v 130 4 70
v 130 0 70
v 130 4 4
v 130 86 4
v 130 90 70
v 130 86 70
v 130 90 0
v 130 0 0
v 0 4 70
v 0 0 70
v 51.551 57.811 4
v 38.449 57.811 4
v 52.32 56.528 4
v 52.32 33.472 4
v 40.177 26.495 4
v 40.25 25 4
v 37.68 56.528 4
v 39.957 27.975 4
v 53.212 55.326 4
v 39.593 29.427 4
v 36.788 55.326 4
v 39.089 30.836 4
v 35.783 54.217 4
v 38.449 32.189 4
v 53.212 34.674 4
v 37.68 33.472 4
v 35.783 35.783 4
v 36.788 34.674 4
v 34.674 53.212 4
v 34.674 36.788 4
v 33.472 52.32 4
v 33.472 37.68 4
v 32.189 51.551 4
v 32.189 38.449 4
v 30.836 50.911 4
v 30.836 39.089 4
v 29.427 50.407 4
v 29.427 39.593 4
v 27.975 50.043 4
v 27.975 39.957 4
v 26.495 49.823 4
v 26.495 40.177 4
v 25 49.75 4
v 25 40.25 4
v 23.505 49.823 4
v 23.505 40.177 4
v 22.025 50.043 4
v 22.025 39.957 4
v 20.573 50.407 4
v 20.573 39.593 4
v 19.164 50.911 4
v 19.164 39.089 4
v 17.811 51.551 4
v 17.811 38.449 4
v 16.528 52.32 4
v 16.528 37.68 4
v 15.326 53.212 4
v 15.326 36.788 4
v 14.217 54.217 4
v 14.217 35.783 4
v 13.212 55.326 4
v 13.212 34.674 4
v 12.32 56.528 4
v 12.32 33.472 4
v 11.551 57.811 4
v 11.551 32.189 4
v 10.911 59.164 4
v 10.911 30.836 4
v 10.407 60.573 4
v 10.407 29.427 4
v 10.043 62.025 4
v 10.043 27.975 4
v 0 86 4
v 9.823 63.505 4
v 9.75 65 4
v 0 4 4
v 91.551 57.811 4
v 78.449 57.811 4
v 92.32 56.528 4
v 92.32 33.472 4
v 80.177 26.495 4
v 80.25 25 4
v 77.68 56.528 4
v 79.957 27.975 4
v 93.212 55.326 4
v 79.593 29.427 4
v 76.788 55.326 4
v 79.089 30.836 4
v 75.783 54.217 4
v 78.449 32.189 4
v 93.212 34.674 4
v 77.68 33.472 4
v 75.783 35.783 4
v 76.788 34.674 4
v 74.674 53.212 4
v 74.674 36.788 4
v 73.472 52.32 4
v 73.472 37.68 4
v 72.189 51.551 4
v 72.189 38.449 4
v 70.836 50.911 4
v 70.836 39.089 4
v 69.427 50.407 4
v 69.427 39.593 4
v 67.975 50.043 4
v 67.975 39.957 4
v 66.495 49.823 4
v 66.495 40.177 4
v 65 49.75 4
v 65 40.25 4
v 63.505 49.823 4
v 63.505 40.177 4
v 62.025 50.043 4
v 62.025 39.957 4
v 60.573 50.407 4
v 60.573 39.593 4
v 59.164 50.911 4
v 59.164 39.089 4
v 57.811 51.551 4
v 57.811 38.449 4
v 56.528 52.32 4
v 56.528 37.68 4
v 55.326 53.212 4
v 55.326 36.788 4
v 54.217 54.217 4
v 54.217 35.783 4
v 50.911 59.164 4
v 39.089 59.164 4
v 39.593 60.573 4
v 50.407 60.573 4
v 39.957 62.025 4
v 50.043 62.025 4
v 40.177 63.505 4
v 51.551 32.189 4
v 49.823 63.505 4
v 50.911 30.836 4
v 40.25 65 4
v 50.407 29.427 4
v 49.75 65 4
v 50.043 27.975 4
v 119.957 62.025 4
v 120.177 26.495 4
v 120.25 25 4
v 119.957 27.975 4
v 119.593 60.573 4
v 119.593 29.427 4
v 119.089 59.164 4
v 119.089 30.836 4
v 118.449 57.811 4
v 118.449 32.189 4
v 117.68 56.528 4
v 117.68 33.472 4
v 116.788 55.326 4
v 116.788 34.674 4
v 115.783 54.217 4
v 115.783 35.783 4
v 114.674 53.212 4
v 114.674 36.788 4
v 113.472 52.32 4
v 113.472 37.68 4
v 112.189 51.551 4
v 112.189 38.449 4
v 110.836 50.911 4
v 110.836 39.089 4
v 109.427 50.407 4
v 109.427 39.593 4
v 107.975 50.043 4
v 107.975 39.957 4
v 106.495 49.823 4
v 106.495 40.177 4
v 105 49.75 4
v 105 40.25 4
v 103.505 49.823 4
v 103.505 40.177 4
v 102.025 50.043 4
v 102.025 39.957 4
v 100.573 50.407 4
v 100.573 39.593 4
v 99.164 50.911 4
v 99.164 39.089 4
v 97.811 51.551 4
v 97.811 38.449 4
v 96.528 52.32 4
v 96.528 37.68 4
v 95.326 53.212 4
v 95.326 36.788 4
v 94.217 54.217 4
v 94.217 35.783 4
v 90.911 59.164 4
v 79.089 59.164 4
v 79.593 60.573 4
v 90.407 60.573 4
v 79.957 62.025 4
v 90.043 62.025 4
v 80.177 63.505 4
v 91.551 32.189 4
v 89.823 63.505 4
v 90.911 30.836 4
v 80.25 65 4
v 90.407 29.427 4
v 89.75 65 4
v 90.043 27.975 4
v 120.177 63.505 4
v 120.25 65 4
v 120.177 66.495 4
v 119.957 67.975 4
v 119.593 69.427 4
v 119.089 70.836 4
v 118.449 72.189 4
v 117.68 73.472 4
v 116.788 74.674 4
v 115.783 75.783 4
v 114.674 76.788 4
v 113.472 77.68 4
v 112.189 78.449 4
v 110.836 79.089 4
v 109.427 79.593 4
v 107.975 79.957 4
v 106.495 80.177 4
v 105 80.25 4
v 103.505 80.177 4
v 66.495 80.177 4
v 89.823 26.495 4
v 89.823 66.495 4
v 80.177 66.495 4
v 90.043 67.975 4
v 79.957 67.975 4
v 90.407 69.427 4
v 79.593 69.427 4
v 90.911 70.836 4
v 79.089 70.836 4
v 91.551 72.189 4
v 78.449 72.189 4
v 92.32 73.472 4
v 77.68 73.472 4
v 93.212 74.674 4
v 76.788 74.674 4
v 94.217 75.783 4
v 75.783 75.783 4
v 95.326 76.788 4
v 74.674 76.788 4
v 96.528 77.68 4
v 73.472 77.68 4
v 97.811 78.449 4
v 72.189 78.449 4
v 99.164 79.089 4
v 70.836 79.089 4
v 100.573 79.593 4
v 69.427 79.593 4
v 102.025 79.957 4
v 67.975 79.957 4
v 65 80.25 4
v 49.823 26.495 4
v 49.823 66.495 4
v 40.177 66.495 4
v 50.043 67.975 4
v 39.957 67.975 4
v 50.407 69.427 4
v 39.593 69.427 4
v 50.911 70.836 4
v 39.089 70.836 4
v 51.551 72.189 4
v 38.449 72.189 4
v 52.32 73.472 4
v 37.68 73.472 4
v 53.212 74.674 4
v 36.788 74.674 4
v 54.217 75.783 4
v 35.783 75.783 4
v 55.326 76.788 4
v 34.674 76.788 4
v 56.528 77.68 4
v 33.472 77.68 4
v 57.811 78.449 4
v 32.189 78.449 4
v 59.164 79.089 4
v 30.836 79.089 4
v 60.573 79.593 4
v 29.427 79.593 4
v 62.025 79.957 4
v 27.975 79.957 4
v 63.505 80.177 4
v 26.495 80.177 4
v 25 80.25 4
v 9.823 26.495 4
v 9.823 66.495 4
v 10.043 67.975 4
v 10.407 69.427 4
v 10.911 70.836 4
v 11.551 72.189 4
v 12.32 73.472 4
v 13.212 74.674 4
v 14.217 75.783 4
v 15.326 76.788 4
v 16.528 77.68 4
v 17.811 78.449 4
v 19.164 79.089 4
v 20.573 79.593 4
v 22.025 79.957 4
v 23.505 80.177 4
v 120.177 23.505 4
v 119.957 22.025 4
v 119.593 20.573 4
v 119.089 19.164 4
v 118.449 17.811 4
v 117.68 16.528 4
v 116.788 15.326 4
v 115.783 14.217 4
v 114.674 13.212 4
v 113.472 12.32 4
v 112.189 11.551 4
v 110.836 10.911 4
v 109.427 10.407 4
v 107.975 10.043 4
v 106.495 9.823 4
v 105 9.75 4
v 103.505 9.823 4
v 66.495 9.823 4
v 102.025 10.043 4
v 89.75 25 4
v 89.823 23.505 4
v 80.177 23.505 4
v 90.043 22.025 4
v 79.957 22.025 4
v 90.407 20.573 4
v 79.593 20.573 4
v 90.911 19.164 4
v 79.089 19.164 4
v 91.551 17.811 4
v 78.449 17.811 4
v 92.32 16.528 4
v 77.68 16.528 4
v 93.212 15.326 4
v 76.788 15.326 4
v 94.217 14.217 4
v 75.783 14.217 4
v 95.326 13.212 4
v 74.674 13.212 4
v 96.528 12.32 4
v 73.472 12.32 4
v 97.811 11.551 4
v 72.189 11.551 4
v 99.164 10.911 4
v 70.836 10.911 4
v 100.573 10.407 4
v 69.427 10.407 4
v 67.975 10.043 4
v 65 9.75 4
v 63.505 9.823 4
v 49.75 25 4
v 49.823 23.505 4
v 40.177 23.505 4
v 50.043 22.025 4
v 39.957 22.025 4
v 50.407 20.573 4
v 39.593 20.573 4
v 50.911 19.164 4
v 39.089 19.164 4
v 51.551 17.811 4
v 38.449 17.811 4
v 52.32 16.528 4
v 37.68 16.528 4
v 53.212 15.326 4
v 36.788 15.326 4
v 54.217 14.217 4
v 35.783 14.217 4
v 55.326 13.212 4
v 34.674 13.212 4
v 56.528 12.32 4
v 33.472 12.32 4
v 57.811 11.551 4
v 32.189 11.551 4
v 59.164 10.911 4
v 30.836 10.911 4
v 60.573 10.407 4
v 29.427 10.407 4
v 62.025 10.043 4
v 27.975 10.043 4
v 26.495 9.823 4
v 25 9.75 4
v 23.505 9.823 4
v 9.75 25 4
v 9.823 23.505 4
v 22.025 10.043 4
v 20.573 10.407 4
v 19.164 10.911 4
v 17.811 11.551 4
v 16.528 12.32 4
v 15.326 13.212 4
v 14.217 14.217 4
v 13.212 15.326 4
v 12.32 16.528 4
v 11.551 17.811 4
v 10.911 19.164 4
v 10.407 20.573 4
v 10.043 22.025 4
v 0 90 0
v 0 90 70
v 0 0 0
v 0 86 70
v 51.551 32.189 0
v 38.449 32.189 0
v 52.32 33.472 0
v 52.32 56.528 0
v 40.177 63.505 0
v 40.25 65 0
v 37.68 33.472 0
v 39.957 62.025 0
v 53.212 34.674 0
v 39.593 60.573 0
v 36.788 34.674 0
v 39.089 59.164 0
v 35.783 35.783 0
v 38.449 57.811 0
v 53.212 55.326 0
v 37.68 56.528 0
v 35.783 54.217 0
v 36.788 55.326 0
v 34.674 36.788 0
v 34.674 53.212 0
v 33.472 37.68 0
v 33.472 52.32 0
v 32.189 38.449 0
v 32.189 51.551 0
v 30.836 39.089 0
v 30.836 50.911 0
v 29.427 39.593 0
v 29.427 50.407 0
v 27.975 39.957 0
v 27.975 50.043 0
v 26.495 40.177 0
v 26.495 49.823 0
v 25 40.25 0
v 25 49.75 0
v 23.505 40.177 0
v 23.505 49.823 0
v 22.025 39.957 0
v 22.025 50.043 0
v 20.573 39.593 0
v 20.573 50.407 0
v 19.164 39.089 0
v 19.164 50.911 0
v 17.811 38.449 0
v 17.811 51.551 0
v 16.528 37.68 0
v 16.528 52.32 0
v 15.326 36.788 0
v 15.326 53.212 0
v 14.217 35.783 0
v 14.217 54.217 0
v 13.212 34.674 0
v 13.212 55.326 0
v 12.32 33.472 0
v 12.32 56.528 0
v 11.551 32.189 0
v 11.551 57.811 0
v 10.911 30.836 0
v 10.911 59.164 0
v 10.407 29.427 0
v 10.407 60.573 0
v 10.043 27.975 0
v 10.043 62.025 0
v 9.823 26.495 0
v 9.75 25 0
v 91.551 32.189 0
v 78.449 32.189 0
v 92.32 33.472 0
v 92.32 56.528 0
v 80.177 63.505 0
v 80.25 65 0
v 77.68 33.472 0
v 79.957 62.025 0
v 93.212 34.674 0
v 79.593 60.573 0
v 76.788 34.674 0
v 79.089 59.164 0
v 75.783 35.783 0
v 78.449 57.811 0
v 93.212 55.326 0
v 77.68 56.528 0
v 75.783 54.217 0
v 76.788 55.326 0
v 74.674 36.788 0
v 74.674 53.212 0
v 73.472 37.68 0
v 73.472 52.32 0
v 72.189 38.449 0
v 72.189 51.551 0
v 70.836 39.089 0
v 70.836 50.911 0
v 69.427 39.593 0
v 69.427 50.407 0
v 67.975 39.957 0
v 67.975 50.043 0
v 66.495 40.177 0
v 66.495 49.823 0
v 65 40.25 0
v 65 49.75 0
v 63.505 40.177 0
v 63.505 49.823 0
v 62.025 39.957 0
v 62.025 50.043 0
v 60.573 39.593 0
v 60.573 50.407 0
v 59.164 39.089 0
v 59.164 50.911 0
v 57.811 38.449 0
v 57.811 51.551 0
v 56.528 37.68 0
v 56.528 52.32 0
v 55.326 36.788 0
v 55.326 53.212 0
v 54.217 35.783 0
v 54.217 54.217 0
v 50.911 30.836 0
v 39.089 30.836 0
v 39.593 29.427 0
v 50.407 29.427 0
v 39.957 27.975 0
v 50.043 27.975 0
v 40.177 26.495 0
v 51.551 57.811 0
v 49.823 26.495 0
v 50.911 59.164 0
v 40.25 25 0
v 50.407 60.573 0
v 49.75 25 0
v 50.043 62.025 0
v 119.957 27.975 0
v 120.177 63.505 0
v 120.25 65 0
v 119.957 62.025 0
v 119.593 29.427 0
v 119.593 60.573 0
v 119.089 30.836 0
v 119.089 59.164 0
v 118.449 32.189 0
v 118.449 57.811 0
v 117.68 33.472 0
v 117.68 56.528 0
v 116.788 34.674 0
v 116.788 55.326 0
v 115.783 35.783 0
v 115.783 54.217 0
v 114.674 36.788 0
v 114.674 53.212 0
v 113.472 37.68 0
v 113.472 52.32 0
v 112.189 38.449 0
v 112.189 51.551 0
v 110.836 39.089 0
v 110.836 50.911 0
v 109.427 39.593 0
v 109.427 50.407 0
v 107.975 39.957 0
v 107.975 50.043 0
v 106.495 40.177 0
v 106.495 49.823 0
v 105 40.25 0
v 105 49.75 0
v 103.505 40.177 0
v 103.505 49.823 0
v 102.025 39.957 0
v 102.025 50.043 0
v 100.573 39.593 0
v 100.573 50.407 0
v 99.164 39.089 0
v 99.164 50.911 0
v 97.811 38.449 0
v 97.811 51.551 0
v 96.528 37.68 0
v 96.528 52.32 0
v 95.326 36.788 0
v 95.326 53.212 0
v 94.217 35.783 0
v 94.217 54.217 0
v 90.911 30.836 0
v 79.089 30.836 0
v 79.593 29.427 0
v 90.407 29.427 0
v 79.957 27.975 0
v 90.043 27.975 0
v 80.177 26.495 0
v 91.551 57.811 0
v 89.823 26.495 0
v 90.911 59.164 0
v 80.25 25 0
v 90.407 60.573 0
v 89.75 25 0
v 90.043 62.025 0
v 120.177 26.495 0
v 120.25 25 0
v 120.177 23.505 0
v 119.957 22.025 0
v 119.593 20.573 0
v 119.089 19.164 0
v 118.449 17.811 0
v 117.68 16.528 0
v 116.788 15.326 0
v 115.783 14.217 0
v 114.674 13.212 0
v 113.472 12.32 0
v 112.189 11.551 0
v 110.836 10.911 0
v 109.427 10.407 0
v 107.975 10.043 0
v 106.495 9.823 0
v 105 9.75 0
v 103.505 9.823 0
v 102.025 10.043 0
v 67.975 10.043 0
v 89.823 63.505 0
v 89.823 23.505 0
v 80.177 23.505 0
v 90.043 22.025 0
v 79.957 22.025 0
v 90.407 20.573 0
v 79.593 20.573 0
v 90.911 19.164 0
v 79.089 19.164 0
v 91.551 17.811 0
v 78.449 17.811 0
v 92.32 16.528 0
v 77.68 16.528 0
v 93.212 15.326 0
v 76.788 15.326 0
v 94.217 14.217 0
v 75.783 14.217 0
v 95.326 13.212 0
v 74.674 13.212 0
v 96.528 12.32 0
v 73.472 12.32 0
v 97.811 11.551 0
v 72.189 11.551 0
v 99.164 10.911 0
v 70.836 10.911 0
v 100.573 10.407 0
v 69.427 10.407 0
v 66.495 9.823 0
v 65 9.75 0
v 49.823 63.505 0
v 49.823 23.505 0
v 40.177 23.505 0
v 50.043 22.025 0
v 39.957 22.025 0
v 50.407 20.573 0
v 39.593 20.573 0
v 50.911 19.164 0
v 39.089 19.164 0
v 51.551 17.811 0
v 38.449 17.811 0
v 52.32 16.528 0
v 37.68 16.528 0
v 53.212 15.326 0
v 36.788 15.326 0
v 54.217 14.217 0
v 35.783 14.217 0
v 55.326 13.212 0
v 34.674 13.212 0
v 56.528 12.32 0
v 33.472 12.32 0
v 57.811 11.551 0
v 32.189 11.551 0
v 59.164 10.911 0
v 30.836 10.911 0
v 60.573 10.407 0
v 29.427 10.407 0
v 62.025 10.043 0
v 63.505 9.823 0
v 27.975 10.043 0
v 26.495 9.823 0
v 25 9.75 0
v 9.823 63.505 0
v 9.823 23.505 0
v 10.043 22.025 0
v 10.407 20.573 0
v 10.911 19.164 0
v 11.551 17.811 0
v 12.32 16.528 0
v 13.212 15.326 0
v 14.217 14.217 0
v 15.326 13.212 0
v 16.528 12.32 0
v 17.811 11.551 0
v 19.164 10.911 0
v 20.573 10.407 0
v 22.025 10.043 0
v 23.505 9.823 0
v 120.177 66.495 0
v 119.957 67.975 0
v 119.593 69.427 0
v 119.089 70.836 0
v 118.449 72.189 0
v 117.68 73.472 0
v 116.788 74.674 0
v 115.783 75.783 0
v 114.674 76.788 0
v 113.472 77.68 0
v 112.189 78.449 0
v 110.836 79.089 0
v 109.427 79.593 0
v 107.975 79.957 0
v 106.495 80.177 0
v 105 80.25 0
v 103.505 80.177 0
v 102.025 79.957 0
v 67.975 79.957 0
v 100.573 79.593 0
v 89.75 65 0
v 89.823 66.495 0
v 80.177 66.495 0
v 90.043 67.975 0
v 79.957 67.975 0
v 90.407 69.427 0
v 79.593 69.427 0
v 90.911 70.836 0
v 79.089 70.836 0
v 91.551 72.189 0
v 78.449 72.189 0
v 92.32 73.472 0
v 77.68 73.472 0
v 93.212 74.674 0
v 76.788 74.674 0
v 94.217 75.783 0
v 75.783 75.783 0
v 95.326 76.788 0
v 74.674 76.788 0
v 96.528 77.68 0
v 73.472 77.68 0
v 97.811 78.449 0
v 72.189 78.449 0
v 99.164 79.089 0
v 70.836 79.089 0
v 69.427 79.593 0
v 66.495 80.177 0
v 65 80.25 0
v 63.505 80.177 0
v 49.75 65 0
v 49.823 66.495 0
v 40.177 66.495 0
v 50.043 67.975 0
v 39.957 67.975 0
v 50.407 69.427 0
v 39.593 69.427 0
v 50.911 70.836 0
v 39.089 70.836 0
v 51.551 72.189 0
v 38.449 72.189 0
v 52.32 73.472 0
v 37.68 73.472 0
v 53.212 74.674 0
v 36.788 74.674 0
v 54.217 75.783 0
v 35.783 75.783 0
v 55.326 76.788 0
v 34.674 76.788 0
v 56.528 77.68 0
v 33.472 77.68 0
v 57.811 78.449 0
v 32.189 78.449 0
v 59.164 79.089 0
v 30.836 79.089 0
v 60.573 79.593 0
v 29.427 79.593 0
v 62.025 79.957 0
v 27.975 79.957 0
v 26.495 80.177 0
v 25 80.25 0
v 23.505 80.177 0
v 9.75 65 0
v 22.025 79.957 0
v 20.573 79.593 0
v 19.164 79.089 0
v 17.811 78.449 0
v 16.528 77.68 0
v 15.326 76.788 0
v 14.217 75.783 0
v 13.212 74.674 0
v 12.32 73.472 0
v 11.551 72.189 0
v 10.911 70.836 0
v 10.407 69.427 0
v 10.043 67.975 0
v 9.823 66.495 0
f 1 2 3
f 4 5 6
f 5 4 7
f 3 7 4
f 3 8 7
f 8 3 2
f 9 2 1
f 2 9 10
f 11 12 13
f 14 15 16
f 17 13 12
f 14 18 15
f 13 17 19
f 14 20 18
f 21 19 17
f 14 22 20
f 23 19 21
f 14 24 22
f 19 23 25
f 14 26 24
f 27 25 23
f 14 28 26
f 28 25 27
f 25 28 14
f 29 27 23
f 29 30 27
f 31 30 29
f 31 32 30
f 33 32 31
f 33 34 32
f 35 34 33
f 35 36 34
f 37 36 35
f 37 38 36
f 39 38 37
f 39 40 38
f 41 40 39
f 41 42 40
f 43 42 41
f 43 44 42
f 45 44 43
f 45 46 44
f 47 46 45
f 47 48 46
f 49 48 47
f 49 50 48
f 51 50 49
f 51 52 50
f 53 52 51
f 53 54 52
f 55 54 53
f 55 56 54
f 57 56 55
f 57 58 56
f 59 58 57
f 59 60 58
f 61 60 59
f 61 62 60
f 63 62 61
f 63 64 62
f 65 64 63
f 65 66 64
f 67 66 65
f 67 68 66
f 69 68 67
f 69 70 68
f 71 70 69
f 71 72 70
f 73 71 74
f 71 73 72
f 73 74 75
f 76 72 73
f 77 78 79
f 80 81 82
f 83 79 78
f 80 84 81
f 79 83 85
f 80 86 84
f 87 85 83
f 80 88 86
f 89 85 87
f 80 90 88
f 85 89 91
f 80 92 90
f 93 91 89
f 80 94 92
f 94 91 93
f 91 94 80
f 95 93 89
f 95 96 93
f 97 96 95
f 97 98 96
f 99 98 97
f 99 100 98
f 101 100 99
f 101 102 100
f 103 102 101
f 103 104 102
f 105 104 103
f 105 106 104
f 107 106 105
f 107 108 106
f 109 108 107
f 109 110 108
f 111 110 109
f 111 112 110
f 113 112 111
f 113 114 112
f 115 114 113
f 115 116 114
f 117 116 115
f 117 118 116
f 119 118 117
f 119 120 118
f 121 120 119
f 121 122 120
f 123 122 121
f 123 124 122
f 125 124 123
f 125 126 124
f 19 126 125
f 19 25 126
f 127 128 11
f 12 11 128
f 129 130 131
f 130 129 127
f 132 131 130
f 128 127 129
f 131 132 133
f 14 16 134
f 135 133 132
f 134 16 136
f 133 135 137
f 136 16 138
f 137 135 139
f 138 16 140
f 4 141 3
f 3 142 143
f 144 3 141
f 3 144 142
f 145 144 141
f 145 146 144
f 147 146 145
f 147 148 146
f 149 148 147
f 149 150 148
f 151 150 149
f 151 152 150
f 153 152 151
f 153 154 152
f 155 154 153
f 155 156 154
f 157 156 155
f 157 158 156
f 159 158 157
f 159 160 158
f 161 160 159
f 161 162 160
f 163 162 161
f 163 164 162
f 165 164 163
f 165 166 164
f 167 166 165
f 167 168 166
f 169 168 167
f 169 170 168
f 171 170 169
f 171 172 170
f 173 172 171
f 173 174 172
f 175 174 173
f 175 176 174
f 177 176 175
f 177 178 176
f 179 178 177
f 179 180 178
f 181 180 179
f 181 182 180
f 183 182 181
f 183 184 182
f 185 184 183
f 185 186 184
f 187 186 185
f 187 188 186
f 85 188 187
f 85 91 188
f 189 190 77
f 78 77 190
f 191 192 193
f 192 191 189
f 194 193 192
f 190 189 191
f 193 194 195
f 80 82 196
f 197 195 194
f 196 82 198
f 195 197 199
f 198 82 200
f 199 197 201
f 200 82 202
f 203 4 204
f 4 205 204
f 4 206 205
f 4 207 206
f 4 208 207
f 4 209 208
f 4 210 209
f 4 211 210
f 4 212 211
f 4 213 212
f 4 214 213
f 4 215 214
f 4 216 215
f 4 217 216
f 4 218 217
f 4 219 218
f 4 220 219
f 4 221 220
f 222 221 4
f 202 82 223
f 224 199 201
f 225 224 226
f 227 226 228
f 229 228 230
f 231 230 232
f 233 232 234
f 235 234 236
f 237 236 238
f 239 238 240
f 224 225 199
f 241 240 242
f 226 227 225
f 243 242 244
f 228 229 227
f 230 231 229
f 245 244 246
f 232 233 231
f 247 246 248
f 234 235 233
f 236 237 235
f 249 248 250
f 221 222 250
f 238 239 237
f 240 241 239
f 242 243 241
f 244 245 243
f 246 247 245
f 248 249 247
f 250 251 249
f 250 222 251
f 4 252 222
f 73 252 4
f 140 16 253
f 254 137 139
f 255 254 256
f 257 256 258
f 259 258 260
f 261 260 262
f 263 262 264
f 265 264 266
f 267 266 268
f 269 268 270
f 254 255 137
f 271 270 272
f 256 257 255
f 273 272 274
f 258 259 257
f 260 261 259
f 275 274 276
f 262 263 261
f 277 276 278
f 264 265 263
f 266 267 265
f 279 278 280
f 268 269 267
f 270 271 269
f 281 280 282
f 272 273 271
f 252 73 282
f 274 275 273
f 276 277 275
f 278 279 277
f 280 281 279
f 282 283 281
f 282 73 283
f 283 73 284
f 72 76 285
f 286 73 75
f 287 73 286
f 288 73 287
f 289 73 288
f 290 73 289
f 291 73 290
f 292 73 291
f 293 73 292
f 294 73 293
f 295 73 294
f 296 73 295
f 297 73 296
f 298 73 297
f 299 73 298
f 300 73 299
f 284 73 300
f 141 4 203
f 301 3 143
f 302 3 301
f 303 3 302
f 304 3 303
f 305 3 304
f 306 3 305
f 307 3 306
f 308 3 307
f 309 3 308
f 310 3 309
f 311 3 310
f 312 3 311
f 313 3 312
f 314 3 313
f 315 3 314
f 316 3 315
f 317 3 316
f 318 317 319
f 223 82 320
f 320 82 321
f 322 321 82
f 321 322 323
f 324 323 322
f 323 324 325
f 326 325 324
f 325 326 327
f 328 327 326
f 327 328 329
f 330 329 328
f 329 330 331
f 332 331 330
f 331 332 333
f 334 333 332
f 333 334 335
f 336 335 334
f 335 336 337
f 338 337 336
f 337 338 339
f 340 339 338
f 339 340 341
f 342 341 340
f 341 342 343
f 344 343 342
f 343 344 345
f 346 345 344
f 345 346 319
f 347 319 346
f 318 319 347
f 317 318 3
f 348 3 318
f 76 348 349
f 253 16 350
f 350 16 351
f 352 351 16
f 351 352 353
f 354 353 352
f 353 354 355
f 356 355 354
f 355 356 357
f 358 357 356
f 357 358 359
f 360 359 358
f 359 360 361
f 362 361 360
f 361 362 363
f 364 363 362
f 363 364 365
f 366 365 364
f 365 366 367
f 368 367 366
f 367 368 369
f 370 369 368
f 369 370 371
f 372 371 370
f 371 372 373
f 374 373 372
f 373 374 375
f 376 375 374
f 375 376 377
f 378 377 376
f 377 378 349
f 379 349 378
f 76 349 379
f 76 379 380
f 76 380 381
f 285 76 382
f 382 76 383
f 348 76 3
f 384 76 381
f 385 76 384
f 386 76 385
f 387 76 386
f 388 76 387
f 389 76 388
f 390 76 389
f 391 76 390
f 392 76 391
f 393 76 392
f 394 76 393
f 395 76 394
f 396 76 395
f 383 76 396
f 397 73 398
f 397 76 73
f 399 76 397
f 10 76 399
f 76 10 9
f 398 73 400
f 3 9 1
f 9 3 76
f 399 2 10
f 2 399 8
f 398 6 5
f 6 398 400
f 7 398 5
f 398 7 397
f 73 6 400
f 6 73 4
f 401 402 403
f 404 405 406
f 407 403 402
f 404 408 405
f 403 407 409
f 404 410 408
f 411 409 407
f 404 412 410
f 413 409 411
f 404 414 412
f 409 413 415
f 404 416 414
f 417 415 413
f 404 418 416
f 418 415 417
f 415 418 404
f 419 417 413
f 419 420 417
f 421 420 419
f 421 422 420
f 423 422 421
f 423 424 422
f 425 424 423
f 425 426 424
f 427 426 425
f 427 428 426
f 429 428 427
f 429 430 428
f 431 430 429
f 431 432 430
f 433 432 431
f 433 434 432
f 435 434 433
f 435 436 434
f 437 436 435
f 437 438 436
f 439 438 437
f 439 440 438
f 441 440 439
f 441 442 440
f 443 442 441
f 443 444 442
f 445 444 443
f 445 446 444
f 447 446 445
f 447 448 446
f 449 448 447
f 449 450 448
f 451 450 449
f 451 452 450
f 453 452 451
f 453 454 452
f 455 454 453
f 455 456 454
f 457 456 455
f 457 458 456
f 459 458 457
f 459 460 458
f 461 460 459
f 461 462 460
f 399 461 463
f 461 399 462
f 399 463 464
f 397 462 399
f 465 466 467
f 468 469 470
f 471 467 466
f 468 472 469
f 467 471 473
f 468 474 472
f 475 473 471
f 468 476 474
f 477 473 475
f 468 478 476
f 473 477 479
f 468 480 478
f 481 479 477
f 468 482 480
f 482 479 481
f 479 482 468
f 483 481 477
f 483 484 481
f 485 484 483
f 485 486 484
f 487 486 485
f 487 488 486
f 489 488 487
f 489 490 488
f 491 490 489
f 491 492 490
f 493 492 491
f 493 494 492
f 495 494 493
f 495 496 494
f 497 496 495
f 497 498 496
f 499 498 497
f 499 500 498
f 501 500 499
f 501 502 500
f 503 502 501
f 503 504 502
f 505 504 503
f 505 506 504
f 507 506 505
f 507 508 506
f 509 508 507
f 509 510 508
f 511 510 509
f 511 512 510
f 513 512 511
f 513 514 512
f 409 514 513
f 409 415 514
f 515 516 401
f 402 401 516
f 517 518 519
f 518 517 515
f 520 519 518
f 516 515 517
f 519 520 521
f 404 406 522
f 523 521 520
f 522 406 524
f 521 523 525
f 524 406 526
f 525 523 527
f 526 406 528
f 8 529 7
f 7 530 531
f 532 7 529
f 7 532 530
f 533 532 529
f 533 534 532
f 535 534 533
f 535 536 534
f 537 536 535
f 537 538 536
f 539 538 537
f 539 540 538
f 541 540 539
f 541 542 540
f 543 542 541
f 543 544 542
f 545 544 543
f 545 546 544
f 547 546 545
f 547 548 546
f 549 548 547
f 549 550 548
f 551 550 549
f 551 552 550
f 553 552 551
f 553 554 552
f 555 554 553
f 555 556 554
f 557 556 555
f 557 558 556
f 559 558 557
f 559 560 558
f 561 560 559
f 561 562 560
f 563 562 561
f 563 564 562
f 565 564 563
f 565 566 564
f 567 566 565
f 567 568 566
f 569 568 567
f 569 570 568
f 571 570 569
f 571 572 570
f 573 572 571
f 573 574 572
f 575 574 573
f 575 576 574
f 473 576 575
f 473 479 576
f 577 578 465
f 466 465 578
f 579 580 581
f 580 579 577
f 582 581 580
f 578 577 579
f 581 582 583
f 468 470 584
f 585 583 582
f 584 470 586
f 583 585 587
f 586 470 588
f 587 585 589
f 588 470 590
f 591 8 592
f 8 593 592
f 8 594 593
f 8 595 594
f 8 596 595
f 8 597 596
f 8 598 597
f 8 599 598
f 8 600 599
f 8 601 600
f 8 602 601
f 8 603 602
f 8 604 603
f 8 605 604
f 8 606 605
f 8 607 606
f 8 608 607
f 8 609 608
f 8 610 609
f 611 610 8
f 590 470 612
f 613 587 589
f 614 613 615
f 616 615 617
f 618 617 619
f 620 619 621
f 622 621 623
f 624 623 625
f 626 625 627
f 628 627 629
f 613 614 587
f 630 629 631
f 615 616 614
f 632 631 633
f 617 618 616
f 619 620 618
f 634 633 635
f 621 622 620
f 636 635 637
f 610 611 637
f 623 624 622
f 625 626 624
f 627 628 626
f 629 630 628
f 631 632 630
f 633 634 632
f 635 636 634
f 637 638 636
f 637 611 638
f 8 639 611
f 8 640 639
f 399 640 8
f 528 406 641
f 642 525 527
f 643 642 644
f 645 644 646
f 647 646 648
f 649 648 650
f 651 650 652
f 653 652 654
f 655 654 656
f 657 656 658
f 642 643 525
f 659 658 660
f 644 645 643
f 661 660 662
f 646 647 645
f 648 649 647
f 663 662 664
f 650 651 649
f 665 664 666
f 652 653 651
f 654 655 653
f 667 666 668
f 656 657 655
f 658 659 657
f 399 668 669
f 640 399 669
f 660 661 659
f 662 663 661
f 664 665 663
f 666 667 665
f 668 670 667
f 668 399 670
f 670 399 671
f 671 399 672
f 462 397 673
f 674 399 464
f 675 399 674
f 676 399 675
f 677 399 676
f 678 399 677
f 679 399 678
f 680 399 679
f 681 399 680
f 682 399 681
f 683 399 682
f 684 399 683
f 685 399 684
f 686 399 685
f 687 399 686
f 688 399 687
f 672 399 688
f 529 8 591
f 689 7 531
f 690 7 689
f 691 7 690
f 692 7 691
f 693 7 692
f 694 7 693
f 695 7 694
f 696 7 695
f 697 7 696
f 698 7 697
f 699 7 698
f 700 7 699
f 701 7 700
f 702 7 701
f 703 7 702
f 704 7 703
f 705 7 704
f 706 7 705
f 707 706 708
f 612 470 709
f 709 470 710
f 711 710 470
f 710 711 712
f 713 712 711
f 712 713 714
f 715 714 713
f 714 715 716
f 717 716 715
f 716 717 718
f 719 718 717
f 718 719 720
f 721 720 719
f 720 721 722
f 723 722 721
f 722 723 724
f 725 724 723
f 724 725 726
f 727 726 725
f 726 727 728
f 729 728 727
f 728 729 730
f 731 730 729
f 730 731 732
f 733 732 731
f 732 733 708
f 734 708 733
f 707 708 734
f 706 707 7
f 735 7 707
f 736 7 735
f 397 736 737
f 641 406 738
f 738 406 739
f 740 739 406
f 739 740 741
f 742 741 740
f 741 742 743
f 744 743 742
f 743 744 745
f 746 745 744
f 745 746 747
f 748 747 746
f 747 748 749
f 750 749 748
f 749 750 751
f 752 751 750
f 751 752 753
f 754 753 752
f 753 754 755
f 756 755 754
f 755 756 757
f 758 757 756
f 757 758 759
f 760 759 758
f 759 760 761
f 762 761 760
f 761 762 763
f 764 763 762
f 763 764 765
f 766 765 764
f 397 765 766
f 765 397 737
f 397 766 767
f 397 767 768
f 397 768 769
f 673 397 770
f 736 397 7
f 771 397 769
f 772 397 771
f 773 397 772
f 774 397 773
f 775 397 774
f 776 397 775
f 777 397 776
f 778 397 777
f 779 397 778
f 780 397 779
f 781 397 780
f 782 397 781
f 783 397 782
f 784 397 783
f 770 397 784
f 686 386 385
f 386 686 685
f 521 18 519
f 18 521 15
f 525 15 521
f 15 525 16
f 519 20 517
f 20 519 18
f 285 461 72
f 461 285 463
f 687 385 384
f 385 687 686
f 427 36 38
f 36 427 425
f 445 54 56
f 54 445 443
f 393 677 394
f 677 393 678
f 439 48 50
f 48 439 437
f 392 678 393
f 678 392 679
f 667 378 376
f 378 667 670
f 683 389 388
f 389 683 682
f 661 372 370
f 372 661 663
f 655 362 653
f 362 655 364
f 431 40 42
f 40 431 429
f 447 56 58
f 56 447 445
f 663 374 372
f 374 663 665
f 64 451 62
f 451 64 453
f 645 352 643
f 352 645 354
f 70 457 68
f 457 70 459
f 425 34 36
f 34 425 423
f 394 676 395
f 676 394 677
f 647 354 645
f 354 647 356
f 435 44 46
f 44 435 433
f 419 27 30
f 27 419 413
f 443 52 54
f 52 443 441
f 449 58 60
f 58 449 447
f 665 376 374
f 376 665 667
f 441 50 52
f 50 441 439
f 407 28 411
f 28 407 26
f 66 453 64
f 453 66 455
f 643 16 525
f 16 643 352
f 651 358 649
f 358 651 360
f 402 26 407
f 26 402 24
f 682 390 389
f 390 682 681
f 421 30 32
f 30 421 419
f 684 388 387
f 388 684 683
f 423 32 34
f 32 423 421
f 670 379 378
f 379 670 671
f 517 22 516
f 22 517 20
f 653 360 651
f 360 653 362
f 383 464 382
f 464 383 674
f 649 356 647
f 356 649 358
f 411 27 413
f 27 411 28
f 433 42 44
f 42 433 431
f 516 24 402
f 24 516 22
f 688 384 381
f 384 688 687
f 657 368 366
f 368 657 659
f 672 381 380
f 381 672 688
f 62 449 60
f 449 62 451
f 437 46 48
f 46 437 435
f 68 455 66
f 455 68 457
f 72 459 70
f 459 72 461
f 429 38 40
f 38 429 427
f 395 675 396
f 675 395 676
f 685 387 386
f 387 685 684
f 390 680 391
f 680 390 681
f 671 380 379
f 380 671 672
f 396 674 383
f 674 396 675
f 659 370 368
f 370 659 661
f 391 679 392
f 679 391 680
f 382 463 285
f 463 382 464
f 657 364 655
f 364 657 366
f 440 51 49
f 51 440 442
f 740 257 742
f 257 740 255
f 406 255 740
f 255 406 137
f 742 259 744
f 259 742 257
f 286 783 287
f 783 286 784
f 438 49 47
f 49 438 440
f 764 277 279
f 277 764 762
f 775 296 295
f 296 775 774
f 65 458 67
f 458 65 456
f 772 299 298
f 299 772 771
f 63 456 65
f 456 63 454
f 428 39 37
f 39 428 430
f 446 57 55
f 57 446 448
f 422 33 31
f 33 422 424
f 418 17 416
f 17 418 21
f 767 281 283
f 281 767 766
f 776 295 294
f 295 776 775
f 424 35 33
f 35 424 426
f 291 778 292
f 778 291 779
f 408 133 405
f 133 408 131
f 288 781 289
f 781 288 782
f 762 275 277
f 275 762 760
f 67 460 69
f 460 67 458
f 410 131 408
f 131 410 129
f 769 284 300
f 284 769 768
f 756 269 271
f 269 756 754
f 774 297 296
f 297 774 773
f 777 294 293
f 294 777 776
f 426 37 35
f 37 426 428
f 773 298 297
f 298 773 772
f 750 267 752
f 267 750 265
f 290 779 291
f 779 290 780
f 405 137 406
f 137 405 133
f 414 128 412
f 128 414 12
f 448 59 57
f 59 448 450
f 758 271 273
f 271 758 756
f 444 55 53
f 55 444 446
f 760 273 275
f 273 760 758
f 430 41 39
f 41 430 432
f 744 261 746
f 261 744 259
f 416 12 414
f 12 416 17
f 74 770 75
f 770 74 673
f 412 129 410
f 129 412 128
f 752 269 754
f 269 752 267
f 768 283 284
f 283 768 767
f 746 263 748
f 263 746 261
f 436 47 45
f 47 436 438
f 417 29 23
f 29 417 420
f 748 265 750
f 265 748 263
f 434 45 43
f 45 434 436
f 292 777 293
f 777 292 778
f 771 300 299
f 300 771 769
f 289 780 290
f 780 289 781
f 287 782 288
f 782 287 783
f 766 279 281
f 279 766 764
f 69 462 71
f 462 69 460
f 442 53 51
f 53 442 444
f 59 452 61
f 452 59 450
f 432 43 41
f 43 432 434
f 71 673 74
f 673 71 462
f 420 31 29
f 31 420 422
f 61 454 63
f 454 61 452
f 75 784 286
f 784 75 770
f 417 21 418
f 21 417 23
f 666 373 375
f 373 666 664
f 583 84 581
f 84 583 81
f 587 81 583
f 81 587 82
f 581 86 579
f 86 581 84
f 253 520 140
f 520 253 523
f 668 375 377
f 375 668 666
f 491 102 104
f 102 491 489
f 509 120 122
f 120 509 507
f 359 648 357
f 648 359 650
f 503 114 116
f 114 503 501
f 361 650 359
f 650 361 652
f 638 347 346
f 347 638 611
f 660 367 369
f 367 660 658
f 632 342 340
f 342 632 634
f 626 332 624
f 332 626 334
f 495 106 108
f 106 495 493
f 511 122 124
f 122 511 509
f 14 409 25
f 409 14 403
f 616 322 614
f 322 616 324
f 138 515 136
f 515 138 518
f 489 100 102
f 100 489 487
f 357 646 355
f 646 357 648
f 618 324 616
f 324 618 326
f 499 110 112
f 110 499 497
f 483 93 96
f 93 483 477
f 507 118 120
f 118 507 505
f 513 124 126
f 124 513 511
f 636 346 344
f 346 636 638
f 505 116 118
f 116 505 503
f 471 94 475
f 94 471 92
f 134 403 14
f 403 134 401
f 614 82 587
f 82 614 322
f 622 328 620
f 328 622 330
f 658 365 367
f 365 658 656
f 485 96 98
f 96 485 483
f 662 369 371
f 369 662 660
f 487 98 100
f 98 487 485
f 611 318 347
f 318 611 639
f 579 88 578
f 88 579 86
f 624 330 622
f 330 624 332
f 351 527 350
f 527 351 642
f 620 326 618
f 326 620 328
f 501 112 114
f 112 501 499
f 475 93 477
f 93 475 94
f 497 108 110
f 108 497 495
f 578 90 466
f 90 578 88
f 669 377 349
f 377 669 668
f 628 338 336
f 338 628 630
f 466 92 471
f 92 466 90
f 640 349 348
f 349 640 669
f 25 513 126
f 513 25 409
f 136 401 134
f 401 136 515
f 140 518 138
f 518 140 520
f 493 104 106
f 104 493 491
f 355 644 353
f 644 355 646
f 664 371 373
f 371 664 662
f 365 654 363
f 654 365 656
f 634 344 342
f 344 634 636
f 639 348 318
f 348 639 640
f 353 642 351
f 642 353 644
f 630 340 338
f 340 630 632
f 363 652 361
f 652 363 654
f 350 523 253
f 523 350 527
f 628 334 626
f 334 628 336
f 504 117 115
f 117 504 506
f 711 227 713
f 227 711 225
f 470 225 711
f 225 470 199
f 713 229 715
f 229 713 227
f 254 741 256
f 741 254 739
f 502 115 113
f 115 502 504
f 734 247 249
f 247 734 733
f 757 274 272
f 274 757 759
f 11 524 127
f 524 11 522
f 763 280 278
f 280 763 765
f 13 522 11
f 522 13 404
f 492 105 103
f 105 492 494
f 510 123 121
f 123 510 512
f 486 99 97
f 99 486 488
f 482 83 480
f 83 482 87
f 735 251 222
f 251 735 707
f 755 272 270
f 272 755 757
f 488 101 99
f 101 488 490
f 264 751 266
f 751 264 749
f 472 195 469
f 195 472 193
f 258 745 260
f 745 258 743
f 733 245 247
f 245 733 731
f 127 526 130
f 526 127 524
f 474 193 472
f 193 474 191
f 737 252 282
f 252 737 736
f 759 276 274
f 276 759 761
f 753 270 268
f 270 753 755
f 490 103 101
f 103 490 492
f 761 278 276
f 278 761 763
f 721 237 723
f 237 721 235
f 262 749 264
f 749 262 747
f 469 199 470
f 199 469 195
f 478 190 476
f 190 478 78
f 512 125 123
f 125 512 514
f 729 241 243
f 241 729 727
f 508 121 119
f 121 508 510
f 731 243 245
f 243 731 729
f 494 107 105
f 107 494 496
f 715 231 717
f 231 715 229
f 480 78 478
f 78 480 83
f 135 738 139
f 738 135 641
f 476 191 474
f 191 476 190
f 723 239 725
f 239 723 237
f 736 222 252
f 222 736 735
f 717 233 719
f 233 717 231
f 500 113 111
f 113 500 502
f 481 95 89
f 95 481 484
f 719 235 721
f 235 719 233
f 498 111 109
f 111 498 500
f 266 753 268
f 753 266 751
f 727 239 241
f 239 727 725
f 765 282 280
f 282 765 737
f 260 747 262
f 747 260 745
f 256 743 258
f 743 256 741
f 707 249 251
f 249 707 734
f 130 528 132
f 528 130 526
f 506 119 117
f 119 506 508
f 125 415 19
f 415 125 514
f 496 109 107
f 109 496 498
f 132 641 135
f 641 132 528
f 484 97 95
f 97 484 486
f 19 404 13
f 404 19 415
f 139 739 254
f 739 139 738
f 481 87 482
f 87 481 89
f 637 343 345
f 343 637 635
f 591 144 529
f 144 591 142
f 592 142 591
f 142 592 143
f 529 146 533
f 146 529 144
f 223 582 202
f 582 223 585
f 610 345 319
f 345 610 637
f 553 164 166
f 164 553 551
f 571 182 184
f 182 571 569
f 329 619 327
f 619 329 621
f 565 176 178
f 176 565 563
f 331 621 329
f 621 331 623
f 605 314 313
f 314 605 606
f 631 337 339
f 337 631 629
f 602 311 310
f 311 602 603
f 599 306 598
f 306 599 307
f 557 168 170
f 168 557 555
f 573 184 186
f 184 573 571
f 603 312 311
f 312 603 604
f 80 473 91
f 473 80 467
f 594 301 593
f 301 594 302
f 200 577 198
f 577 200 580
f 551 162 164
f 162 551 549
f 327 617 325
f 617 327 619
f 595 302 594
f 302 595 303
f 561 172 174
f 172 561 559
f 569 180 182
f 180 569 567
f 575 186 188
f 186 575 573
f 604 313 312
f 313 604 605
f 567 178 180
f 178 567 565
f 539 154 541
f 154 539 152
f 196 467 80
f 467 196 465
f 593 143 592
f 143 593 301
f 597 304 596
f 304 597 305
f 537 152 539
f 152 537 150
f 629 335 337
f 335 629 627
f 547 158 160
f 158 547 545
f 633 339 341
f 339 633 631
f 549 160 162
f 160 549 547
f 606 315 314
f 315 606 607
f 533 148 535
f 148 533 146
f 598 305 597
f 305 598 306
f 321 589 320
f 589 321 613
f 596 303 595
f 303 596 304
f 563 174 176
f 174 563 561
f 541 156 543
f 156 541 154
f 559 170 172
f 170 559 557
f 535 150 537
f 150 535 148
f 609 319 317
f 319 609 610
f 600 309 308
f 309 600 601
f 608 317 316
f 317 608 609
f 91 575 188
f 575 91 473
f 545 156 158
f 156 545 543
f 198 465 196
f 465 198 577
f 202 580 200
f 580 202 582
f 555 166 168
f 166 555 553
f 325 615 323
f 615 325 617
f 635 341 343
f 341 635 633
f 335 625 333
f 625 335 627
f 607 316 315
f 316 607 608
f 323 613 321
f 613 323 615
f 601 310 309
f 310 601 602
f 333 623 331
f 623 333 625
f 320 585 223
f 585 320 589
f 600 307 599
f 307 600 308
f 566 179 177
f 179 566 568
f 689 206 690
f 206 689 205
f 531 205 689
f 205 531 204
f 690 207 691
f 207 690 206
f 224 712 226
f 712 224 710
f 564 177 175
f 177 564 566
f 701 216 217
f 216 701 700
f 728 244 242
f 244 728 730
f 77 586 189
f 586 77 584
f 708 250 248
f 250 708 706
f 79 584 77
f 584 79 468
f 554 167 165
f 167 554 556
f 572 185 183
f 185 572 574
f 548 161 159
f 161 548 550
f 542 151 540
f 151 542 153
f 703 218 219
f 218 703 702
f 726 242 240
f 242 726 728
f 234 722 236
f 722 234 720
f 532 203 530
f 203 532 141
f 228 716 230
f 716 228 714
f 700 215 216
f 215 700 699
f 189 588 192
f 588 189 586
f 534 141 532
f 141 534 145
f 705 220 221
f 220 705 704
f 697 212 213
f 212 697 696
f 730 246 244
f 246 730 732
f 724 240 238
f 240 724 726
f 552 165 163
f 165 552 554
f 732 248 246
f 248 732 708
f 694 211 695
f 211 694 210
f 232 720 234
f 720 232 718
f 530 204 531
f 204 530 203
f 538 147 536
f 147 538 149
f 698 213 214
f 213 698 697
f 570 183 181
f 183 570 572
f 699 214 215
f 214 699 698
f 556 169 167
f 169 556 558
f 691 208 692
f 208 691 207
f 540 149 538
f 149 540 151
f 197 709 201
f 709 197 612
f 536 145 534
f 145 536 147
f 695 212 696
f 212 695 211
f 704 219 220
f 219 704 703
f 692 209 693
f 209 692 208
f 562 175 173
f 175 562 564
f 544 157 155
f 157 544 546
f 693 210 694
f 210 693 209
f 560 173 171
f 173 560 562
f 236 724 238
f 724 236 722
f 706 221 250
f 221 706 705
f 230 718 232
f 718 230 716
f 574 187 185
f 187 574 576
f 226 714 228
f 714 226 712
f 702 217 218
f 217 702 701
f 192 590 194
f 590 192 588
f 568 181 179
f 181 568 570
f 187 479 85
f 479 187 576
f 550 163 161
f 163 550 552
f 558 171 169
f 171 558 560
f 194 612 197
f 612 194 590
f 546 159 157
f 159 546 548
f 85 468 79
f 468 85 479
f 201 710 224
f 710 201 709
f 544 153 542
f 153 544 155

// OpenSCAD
// Rack for six 50 mL conical (Falcon-type) tubes
// Printed upside down and flipped over after printing

$fn = 64;

// Plate dimensions
plate_length = 130; // X direction
plate_width  = 90;  // Y direction
plate_thick  = 4;   // Z direction

// Hole pattern
hole_dia = 30.5;
hole_pitch_x = 40; // X direction spacing
hole_pitch_y = 40; // Y direction spacing
num_holes_x = 3;
num_holes_y = 2;

// Wall dimensions
wall_thick = 4;
wall_height = 66; // 70 - 4 = 66 mm (from top of plate at z=4 to z=70)

// Calculate hole positions (centred on plate)
plate_centre_x = plate_length / 2;
plate_centre_y = plate_width / 2;

// Total span of holes
holes_span_x = (num_holes_x - 1) * hole_pitch_x;
holes_span_y = (num_holes_y - 1) * hole_pitch_y;

// Offset from plate centre to first hole
offset_x = (holes_span_x) / 2;
offset_y = (holes_span_y) / 2;

// Plate
module plate() {
    translate([0, 0, 0])
        cube([plate_length, plate_width, plate_thick]);
}

// Holes
module holes() {
    for (i = [0 : num_holes_x - 1]) {
        for (j = [0 : num_holes_y - 1]) {
            x = plate_centre_x - offset_x + i * hole_pitch_x;
            y = plate_centre_y - offset_y + j * hole_pitch_y;
            translate([x, y, -1])
                cylinder(d = hole_dia, h = plate_thick + 2);
        }
    }
}

// Walls (along long edges, i.e., along X-axis at Y = 0 and Y = plate_width)
module walls() {
    // Front wall (Y = 0)
    translate([0, 0, plate_thick])
        cube([plate_length, wall_thick, wall_height]);
    
    // Back wall (Y = plate_width - wall_thick)
    translate([0, plate_width - wall_thick, plate_thick])
        cube([plate_length, wall_thick, wall_height]);
}

// Build the rack
difference() {
    union() {
        plate();
        walls();
    }
    holes();
}
